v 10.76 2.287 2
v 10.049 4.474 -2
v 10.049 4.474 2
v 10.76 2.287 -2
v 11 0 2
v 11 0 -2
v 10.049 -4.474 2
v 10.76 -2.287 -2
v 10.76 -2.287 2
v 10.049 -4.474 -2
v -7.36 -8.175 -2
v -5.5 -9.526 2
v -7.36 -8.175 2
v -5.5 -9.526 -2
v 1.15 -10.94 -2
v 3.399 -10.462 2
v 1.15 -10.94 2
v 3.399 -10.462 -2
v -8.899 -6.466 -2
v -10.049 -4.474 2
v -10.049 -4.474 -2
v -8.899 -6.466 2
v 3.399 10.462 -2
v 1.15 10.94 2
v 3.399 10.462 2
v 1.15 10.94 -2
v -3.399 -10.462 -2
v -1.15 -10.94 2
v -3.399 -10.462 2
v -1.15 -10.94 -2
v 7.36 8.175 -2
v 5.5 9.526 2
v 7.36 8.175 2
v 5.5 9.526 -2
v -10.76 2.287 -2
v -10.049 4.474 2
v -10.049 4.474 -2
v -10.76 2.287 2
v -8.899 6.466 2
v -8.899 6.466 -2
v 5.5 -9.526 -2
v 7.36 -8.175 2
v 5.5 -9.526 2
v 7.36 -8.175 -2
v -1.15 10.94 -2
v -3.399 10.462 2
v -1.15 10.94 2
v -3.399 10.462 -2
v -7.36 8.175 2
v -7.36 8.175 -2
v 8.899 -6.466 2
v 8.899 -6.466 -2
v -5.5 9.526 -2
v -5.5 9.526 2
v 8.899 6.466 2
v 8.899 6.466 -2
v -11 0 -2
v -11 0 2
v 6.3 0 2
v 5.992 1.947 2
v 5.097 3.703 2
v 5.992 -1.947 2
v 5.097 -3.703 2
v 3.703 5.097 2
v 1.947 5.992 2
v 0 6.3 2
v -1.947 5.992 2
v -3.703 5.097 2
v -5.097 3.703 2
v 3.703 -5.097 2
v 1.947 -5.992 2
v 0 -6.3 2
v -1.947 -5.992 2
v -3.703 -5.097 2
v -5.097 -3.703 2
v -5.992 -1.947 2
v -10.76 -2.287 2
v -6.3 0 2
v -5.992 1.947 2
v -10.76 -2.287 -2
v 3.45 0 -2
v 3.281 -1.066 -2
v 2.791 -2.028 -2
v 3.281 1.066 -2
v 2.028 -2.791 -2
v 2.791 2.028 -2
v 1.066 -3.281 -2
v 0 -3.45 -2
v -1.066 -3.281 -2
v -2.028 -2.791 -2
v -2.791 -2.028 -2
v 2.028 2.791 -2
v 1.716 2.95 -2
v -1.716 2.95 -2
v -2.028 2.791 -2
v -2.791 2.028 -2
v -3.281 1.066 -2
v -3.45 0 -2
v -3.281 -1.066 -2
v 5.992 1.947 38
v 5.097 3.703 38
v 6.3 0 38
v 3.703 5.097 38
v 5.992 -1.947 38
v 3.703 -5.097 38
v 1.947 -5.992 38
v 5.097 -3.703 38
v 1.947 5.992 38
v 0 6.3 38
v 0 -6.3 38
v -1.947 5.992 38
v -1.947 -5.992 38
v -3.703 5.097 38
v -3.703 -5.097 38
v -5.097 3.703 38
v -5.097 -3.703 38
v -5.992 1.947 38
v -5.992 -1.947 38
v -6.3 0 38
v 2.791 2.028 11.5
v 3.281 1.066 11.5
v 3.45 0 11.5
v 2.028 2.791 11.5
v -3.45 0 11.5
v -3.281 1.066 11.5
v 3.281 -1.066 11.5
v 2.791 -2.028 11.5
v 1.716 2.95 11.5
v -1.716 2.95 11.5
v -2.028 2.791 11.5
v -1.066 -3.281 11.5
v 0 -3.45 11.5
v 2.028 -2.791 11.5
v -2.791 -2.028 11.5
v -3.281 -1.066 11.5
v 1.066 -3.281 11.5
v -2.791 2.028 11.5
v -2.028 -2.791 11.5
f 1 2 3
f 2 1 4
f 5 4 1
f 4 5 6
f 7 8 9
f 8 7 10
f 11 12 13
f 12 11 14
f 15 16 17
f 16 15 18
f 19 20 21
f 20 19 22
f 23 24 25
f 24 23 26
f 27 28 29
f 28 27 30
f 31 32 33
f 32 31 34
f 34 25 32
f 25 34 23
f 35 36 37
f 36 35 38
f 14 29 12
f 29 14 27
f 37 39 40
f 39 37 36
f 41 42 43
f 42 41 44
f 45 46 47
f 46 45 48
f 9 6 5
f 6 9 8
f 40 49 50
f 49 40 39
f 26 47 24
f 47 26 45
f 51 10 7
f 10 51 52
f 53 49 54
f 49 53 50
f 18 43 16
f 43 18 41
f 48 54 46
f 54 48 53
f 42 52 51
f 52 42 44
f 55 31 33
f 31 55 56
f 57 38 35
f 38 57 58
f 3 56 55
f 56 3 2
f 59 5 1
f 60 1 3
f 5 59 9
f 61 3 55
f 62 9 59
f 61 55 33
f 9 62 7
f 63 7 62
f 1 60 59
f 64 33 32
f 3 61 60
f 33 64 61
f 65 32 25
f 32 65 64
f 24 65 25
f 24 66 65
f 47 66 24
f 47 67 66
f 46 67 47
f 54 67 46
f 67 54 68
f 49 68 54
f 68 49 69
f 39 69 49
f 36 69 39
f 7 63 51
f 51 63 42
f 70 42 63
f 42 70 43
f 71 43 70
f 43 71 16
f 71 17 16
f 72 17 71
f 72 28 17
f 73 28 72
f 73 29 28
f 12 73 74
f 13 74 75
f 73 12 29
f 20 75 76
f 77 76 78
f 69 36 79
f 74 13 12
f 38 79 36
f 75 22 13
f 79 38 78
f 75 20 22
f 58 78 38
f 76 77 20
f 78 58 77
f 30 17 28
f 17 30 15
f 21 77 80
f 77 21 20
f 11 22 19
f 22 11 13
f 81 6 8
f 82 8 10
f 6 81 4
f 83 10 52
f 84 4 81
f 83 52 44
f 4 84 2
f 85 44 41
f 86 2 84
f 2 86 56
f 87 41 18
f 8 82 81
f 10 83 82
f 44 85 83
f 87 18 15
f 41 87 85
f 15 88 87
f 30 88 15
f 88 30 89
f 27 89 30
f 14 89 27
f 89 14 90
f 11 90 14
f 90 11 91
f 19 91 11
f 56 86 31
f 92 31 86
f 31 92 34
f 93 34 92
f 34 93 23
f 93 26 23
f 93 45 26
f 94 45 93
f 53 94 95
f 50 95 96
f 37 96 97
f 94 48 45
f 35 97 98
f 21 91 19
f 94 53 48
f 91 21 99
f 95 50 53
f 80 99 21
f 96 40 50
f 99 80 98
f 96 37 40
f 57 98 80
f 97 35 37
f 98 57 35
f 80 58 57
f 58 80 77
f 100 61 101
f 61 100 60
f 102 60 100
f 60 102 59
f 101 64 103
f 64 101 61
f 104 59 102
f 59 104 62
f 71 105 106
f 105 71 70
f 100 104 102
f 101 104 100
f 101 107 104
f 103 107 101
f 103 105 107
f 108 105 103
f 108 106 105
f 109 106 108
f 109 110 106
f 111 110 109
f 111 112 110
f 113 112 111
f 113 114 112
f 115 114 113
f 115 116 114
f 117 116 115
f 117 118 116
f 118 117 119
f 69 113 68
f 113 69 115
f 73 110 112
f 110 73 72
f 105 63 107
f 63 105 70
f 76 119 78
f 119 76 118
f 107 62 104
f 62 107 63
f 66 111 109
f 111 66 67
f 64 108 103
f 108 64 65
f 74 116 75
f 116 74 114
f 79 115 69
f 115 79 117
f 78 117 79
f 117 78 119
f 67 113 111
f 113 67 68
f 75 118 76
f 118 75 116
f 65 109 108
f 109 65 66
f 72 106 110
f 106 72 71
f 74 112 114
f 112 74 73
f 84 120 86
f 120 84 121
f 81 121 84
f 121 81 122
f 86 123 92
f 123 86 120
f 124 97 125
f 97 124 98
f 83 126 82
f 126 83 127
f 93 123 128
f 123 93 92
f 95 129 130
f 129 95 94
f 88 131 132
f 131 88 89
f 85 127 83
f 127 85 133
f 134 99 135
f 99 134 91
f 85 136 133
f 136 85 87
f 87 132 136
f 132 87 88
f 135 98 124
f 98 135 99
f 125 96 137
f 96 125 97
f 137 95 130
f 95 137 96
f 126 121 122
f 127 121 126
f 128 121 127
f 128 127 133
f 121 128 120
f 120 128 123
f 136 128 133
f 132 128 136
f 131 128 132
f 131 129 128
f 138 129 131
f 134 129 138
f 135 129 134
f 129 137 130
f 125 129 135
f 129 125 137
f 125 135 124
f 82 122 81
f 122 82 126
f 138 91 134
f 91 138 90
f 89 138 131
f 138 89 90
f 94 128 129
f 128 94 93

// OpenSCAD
/*
 *
 */
module shaft()
{
	shaft_dia = 6.9;
	difference() {
		cylinder(r = shaft_dia/2, h = 15, center = true, $fn = 20);
		translate([0, shaft_dia - 0.5, 0])
			cube([shaft_dia, shaft_dia, 15 + 2], center = true);
	}
}

module wheel_collar()
{
	outer_dia = 22;
	inner_dia = 12.6;
	length = 40;
	difference() {
		union() {
			cylinder(r = outer_dia/2, h = 4, center = true);
			translate([0, 0, length/2 - 2])
				cylinder(r = inner_dia/2, h = length, center = true);
		}
		translate([0, 0, 4])
			shaft();
	}
}

wheel_collar();
